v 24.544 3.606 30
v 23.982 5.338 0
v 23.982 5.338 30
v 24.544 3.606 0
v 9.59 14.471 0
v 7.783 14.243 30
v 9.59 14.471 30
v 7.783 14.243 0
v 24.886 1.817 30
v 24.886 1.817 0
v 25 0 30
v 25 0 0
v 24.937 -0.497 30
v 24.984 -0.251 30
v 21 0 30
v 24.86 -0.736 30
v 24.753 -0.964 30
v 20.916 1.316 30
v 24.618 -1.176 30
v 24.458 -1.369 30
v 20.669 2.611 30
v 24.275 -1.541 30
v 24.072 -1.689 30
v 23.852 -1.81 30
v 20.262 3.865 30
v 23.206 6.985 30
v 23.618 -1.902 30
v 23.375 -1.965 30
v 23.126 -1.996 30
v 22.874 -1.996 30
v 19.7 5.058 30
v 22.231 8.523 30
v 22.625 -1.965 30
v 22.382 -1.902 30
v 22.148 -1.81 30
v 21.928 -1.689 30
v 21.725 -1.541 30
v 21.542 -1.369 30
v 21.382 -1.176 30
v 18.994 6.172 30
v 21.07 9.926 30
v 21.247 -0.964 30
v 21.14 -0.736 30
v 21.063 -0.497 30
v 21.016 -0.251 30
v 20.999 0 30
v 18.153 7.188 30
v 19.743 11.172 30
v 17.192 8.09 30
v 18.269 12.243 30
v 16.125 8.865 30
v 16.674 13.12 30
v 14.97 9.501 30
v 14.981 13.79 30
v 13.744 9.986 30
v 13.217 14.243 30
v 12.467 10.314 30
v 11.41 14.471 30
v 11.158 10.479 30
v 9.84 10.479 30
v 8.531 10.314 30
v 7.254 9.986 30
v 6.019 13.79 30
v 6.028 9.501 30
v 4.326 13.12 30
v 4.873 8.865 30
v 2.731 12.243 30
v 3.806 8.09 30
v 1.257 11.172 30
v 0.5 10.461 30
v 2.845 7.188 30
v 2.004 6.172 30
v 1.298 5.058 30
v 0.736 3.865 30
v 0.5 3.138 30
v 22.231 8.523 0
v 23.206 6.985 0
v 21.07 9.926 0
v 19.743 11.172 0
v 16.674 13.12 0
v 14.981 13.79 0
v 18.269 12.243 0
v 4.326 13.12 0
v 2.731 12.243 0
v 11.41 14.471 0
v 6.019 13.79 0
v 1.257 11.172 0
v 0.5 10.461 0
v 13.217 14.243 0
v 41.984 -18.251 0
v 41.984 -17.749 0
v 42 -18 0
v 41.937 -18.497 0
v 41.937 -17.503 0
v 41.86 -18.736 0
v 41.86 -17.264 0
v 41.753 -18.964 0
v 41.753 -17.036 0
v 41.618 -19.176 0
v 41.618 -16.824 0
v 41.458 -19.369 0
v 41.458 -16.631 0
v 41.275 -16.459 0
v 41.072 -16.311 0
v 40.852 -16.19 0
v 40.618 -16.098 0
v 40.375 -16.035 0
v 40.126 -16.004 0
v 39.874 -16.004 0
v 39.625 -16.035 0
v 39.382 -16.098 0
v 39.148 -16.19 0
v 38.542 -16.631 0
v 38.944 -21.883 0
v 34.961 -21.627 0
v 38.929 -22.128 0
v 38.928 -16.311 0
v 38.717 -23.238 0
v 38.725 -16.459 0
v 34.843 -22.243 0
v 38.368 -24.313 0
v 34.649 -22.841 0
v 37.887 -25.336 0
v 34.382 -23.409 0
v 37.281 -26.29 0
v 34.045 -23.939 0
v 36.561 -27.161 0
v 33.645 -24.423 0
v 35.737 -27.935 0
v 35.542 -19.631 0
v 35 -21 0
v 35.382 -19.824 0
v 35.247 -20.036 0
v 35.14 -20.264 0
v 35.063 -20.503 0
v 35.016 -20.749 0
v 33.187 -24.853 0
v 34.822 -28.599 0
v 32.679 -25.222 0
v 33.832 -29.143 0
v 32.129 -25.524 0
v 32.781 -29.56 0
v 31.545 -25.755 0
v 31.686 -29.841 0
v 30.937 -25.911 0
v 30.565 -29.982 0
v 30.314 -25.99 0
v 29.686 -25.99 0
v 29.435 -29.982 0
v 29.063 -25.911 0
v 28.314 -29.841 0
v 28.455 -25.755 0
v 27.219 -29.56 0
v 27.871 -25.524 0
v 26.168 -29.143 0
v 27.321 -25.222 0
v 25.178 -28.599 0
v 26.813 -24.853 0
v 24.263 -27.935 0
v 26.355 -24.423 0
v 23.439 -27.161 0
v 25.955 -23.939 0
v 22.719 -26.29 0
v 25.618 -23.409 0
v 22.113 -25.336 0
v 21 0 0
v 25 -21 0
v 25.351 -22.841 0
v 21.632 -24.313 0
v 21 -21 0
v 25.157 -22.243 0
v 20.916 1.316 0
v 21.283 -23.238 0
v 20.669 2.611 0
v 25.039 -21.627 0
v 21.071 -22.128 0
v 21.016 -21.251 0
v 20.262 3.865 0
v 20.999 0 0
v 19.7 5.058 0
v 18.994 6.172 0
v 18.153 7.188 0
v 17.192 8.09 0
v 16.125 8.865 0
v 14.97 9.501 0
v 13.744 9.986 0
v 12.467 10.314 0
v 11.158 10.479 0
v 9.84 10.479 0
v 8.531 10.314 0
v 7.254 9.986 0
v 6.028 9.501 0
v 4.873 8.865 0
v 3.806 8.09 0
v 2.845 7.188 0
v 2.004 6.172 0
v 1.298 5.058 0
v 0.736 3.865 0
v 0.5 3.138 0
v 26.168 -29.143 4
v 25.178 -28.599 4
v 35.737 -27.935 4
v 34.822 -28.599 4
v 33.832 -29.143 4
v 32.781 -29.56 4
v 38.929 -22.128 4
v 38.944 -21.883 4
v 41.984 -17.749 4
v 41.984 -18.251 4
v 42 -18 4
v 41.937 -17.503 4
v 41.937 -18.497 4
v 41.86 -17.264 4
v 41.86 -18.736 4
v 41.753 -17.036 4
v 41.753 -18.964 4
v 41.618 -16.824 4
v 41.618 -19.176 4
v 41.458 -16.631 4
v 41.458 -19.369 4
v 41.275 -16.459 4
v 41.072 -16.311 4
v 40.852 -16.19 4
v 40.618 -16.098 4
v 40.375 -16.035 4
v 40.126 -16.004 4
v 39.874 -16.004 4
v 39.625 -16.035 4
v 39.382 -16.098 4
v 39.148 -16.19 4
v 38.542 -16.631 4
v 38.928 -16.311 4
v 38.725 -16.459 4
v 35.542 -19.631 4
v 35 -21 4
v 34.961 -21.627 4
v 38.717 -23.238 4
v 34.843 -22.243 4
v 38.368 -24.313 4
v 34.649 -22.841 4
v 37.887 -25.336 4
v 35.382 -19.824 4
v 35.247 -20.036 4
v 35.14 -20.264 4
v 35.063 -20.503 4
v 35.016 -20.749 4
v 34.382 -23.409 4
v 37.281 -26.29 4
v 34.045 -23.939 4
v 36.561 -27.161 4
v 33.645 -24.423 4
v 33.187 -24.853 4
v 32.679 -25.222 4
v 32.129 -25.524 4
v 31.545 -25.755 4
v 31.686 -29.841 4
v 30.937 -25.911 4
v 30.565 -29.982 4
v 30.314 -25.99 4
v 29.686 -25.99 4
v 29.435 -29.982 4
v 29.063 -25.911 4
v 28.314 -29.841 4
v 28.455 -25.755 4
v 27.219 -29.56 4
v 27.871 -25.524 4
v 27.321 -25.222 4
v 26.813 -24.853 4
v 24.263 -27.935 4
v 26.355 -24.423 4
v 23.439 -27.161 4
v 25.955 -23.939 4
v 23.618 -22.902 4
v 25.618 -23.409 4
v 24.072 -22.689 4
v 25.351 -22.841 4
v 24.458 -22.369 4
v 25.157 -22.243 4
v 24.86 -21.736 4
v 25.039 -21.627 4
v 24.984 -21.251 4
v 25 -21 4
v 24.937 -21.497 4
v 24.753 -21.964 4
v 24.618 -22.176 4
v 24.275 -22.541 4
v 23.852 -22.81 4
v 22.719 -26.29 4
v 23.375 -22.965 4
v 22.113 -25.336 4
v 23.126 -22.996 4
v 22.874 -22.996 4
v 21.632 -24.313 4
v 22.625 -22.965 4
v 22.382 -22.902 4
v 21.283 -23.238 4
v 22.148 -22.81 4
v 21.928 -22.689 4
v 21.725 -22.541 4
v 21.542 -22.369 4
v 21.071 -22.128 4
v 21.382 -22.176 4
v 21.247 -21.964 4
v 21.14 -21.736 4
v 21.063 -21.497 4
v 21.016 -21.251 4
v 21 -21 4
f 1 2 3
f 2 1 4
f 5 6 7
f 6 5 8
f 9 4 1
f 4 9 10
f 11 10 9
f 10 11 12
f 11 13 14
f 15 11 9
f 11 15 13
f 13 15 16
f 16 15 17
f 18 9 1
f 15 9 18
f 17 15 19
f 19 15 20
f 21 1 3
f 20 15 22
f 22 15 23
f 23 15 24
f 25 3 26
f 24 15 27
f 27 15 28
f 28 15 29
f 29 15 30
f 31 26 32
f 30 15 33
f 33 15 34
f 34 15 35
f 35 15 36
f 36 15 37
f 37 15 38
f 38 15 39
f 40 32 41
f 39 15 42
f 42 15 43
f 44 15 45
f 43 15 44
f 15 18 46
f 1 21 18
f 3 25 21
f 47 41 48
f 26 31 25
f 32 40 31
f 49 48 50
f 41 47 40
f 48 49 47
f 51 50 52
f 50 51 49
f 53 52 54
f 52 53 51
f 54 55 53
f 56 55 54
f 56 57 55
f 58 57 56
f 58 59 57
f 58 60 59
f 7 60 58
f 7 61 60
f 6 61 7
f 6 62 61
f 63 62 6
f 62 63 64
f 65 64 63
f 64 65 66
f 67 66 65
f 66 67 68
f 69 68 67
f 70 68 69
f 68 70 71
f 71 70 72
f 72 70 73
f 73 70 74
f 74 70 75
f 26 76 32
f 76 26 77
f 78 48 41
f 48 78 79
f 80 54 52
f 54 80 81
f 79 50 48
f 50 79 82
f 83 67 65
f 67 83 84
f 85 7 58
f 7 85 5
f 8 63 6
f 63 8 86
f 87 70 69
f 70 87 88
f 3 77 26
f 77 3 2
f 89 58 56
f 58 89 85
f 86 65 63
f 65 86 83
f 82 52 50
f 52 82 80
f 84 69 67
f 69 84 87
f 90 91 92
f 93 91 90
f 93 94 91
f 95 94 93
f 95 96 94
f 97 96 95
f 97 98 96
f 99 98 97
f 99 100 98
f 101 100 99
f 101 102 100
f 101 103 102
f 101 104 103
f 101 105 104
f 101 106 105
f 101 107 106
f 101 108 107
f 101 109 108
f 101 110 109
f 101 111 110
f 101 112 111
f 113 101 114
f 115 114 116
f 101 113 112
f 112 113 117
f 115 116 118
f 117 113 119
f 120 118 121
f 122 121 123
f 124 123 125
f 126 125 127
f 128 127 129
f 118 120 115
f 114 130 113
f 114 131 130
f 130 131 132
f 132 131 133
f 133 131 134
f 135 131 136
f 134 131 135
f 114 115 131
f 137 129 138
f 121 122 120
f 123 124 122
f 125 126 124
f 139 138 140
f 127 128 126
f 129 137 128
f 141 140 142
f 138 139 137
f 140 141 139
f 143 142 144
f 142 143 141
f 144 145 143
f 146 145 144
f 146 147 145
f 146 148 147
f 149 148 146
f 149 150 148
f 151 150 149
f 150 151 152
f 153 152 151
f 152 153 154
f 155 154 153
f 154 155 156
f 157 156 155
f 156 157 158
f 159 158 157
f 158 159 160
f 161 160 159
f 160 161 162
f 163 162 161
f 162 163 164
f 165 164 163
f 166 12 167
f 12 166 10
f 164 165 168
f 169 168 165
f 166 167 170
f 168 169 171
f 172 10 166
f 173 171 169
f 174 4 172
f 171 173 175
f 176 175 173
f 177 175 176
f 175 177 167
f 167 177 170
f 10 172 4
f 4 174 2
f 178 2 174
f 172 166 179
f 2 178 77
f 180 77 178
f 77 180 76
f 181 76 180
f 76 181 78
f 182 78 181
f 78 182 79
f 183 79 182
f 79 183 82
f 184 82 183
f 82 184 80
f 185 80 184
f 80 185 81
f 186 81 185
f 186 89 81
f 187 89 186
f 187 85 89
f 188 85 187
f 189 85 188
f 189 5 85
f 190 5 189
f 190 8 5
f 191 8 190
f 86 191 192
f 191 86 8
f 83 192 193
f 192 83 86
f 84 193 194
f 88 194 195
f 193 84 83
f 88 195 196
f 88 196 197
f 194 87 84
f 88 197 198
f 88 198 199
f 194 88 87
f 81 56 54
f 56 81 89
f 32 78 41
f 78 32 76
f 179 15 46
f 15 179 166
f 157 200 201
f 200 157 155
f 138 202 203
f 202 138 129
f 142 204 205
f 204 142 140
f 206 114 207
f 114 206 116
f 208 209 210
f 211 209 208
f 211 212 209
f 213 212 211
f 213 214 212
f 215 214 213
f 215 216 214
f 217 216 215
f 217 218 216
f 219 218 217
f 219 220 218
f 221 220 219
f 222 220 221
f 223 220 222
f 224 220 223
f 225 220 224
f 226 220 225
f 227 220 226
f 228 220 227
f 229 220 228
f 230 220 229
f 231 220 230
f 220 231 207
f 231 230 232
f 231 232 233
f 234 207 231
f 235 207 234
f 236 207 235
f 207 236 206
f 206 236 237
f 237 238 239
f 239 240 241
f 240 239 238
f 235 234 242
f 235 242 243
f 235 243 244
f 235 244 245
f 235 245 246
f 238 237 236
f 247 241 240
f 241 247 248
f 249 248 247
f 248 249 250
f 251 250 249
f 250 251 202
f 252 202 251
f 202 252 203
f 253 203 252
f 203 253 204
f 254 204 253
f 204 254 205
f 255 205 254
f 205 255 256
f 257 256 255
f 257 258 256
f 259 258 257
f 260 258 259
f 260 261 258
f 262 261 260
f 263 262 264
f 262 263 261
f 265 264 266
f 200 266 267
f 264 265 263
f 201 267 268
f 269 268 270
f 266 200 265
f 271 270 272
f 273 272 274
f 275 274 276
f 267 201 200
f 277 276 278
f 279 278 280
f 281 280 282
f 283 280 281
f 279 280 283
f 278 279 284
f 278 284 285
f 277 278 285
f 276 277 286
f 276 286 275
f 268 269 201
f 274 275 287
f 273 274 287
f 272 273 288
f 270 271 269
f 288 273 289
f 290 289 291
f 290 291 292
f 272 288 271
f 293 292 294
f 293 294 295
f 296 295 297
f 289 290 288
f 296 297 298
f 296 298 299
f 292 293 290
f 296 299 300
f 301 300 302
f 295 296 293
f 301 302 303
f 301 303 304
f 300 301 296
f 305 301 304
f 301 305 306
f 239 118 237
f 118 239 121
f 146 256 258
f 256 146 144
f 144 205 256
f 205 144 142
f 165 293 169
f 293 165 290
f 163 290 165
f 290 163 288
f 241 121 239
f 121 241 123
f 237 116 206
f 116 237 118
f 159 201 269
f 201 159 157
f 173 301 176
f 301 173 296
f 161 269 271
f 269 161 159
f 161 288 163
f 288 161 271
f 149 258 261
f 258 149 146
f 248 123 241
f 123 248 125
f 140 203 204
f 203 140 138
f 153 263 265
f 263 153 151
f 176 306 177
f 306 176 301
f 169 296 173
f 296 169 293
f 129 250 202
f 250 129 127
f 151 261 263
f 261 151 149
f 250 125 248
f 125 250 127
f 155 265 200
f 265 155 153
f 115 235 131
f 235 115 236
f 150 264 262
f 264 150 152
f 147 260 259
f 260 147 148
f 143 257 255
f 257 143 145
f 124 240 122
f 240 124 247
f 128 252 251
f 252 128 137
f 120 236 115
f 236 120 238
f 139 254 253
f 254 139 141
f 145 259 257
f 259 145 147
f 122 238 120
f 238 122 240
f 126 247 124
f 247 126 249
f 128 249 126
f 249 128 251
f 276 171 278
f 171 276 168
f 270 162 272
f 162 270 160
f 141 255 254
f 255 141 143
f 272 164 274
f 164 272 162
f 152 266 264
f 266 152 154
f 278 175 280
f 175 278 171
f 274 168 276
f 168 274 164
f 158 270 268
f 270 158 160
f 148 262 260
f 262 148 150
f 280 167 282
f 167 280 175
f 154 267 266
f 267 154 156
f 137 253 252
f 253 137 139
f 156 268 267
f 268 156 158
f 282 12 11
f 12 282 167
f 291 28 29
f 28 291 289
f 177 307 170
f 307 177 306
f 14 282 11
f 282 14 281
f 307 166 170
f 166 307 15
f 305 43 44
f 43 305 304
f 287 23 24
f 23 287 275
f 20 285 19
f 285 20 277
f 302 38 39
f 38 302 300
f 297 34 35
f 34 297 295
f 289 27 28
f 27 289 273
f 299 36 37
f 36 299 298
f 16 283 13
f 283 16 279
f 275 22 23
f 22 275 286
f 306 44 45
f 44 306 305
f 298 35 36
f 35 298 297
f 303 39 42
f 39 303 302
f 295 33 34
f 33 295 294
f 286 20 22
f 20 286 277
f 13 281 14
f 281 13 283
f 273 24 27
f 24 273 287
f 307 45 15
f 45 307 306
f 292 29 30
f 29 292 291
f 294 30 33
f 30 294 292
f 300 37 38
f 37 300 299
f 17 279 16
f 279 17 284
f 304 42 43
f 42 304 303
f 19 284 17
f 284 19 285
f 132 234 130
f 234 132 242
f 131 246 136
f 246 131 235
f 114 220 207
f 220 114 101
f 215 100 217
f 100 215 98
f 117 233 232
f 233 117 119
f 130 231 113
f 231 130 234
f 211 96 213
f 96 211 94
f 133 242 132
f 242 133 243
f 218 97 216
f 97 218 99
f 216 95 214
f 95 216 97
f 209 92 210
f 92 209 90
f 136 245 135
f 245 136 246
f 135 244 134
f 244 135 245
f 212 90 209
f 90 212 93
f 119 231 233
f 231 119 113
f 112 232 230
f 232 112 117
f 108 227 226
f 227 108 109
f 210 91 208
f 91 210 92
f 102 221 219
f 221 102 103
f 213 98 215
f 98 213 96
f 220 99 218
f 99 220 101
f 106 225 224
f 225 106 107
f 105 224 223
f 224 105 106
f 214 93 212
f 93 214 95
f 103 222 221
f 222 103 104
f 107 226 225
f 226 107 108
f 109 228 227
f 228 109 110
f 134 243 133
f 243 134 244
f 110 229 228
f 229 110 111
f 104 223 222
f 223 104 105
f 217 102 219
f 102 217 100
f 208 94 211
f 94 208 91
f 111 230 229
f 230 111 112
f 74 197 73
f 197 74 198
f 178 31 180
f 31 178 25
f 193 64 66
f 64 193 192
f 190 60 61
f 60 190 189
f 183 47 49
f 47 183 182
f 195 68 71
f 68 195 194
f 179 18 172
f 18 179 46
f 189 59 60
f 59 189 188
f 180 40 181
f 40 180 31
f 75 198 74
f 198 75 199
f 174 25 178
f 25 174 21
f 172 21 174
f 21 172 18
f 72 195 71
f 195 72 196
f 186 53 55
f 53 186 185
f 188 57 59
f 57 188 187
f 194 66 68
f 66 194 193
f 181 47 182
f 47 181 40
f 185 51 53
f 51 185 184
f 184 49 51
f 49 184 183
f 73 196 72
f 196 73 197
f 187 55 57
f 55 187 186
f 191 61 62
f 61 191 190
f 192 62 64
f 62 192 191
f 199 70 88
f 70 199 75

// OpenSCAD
$fn=50;
/*
    Parametric Hooks For Picture Rails
    By Brian Khuu (2019)
    
    Many old houses still have picture rails that you can hang pictures or clocks on. This allow you to print a picture rail hook that fits exactly your picture rail. Just measure the diameter of your rail and specify the hook depth you requre.
    
*/


/* [Picture Rail Spec] */
// Centered Hook mode (Requires support but is easier to mount)
centeredHook=false;
// Diameter of picture rail 
dia=21;
// Mount thickness
thickness=4;
// Mount Width
width=30;
// Standoff of the mount away from the wall
standoff=0.5;

/* [Picture Rail Spec] */
// Hook Diameter
hookdia=10;
// Hook Flange
hookflange=3;
// Hook Width
hookwidth=4;

// Calc
hookspacing=dia;

difference()
{
    translate([dia,0,0])
    union()
    {
        // Mount
        translate([-dia/2,0,0])
        difference()
        {
            cylinder(r=dia/2+thickness, h=width);
            translate([0,-dia/2,-1])
                cube([dia,dia/2,width+2]);
        }
        if (!centeredHook)
        { /* Off centered hooks for no support required printing */
            // Hook
            translate([0,0,0])
            hull()
            {
                translate([thickness/2,0,0])
                    cylinder(r=thickness/2, h=width);
                translate([thickness/2,-hookspacing,0])
                    cylinder(r=thickness/2, h=hookwidth);
            }
            translate([hookdia/2+thickness,-hookspacing, hookwidth/2])
                difference()
                {
                    cylinder(r=hookdia/2+thickness, h=hookwidth, center=true);
                    translate([0,0,0])
                        cylinder(r=hookdia/2, h=hookwidth+2, center=true);
                    translate([0,hookdia/2,0])
                        cube([hookdia,hookdia,hookwidth+2], center=true);
                    translate([hookdia/2,hookdia/2,0])
                        cube([hookdia,hookdia,hookwidth+2], center=true);
                }
            translate([hookdia/2+thickness,-hookspacing, 0])
                hull()
                {
                    translate([hookdia/2+thickness/2,0,0])
                        cylinder(r=thickness/2, h=hookwidth);

                    translate([hookdia/2+thickness/2+hookflange,+hookflange,0])
                        cylinder(r=thickness/2, h=hookwidth);
                }
        }
        else
        { /* Centered Hook (Support required) */
            // Hook
            translate([0,0,0])
            hull()
            {
                translate([thickness/2,0,0])
                    cylinder(r=thickness/2, h=width);
                translate([thickness/2,-hookspacing, width/2-hookwidth/2])
                    cylinder(r=thickness/2, h=hookwidth);
            }
            translate([hookdia/2+thickness,-hookspacing, width/2])
                difference()
                {
                    cylinder(r=hookdia/2+thickness, h=hookwidth, center=true);
                    translate([0,0,0])
                        cylinder(r=hookdia/2, h=hookwidth+2, center=true);
                    translate([0,hookdia/2,0])
                        cube([hookdia,hookdia,hookwidth+2], center=true);
                    translate([hookdia/2,hookdia/2,0])
                        cube([hookdia,hookdia,hookwidth+2], center=true);
                }
            translate([hookdia/2+thickness,-hookspacing, width/2-hookwidth/2])
                hull()
                {
                    translate([hookdia/2+thickness/2,0,0])
                        cylinder(r=thickness/2, h=hookwidth);

                    translate([hookdia/2+thickness/2+hookflange,+hookflange,0])
                        cylinder(r=thickness/2, h=hookwidth);
                }
        }

    }
    translate([0,0,(width)/2])
    union()
    {
        // Wall Model
        translate([dia-0.001,0,-(width+2)/2])
            hull()
            {
                translate([-dia/2,0,0])
                    cylinder(r=dia/2, h=width+2);
                translate([-dia/2,-dia-10,0])
                    cylinder(r=dia/2, h=width+2);
            }
        translate([-1000+standoff,-(1000)/2,-(width+2)/2])
            cube([1000,1000,width+2]);
    }
}
